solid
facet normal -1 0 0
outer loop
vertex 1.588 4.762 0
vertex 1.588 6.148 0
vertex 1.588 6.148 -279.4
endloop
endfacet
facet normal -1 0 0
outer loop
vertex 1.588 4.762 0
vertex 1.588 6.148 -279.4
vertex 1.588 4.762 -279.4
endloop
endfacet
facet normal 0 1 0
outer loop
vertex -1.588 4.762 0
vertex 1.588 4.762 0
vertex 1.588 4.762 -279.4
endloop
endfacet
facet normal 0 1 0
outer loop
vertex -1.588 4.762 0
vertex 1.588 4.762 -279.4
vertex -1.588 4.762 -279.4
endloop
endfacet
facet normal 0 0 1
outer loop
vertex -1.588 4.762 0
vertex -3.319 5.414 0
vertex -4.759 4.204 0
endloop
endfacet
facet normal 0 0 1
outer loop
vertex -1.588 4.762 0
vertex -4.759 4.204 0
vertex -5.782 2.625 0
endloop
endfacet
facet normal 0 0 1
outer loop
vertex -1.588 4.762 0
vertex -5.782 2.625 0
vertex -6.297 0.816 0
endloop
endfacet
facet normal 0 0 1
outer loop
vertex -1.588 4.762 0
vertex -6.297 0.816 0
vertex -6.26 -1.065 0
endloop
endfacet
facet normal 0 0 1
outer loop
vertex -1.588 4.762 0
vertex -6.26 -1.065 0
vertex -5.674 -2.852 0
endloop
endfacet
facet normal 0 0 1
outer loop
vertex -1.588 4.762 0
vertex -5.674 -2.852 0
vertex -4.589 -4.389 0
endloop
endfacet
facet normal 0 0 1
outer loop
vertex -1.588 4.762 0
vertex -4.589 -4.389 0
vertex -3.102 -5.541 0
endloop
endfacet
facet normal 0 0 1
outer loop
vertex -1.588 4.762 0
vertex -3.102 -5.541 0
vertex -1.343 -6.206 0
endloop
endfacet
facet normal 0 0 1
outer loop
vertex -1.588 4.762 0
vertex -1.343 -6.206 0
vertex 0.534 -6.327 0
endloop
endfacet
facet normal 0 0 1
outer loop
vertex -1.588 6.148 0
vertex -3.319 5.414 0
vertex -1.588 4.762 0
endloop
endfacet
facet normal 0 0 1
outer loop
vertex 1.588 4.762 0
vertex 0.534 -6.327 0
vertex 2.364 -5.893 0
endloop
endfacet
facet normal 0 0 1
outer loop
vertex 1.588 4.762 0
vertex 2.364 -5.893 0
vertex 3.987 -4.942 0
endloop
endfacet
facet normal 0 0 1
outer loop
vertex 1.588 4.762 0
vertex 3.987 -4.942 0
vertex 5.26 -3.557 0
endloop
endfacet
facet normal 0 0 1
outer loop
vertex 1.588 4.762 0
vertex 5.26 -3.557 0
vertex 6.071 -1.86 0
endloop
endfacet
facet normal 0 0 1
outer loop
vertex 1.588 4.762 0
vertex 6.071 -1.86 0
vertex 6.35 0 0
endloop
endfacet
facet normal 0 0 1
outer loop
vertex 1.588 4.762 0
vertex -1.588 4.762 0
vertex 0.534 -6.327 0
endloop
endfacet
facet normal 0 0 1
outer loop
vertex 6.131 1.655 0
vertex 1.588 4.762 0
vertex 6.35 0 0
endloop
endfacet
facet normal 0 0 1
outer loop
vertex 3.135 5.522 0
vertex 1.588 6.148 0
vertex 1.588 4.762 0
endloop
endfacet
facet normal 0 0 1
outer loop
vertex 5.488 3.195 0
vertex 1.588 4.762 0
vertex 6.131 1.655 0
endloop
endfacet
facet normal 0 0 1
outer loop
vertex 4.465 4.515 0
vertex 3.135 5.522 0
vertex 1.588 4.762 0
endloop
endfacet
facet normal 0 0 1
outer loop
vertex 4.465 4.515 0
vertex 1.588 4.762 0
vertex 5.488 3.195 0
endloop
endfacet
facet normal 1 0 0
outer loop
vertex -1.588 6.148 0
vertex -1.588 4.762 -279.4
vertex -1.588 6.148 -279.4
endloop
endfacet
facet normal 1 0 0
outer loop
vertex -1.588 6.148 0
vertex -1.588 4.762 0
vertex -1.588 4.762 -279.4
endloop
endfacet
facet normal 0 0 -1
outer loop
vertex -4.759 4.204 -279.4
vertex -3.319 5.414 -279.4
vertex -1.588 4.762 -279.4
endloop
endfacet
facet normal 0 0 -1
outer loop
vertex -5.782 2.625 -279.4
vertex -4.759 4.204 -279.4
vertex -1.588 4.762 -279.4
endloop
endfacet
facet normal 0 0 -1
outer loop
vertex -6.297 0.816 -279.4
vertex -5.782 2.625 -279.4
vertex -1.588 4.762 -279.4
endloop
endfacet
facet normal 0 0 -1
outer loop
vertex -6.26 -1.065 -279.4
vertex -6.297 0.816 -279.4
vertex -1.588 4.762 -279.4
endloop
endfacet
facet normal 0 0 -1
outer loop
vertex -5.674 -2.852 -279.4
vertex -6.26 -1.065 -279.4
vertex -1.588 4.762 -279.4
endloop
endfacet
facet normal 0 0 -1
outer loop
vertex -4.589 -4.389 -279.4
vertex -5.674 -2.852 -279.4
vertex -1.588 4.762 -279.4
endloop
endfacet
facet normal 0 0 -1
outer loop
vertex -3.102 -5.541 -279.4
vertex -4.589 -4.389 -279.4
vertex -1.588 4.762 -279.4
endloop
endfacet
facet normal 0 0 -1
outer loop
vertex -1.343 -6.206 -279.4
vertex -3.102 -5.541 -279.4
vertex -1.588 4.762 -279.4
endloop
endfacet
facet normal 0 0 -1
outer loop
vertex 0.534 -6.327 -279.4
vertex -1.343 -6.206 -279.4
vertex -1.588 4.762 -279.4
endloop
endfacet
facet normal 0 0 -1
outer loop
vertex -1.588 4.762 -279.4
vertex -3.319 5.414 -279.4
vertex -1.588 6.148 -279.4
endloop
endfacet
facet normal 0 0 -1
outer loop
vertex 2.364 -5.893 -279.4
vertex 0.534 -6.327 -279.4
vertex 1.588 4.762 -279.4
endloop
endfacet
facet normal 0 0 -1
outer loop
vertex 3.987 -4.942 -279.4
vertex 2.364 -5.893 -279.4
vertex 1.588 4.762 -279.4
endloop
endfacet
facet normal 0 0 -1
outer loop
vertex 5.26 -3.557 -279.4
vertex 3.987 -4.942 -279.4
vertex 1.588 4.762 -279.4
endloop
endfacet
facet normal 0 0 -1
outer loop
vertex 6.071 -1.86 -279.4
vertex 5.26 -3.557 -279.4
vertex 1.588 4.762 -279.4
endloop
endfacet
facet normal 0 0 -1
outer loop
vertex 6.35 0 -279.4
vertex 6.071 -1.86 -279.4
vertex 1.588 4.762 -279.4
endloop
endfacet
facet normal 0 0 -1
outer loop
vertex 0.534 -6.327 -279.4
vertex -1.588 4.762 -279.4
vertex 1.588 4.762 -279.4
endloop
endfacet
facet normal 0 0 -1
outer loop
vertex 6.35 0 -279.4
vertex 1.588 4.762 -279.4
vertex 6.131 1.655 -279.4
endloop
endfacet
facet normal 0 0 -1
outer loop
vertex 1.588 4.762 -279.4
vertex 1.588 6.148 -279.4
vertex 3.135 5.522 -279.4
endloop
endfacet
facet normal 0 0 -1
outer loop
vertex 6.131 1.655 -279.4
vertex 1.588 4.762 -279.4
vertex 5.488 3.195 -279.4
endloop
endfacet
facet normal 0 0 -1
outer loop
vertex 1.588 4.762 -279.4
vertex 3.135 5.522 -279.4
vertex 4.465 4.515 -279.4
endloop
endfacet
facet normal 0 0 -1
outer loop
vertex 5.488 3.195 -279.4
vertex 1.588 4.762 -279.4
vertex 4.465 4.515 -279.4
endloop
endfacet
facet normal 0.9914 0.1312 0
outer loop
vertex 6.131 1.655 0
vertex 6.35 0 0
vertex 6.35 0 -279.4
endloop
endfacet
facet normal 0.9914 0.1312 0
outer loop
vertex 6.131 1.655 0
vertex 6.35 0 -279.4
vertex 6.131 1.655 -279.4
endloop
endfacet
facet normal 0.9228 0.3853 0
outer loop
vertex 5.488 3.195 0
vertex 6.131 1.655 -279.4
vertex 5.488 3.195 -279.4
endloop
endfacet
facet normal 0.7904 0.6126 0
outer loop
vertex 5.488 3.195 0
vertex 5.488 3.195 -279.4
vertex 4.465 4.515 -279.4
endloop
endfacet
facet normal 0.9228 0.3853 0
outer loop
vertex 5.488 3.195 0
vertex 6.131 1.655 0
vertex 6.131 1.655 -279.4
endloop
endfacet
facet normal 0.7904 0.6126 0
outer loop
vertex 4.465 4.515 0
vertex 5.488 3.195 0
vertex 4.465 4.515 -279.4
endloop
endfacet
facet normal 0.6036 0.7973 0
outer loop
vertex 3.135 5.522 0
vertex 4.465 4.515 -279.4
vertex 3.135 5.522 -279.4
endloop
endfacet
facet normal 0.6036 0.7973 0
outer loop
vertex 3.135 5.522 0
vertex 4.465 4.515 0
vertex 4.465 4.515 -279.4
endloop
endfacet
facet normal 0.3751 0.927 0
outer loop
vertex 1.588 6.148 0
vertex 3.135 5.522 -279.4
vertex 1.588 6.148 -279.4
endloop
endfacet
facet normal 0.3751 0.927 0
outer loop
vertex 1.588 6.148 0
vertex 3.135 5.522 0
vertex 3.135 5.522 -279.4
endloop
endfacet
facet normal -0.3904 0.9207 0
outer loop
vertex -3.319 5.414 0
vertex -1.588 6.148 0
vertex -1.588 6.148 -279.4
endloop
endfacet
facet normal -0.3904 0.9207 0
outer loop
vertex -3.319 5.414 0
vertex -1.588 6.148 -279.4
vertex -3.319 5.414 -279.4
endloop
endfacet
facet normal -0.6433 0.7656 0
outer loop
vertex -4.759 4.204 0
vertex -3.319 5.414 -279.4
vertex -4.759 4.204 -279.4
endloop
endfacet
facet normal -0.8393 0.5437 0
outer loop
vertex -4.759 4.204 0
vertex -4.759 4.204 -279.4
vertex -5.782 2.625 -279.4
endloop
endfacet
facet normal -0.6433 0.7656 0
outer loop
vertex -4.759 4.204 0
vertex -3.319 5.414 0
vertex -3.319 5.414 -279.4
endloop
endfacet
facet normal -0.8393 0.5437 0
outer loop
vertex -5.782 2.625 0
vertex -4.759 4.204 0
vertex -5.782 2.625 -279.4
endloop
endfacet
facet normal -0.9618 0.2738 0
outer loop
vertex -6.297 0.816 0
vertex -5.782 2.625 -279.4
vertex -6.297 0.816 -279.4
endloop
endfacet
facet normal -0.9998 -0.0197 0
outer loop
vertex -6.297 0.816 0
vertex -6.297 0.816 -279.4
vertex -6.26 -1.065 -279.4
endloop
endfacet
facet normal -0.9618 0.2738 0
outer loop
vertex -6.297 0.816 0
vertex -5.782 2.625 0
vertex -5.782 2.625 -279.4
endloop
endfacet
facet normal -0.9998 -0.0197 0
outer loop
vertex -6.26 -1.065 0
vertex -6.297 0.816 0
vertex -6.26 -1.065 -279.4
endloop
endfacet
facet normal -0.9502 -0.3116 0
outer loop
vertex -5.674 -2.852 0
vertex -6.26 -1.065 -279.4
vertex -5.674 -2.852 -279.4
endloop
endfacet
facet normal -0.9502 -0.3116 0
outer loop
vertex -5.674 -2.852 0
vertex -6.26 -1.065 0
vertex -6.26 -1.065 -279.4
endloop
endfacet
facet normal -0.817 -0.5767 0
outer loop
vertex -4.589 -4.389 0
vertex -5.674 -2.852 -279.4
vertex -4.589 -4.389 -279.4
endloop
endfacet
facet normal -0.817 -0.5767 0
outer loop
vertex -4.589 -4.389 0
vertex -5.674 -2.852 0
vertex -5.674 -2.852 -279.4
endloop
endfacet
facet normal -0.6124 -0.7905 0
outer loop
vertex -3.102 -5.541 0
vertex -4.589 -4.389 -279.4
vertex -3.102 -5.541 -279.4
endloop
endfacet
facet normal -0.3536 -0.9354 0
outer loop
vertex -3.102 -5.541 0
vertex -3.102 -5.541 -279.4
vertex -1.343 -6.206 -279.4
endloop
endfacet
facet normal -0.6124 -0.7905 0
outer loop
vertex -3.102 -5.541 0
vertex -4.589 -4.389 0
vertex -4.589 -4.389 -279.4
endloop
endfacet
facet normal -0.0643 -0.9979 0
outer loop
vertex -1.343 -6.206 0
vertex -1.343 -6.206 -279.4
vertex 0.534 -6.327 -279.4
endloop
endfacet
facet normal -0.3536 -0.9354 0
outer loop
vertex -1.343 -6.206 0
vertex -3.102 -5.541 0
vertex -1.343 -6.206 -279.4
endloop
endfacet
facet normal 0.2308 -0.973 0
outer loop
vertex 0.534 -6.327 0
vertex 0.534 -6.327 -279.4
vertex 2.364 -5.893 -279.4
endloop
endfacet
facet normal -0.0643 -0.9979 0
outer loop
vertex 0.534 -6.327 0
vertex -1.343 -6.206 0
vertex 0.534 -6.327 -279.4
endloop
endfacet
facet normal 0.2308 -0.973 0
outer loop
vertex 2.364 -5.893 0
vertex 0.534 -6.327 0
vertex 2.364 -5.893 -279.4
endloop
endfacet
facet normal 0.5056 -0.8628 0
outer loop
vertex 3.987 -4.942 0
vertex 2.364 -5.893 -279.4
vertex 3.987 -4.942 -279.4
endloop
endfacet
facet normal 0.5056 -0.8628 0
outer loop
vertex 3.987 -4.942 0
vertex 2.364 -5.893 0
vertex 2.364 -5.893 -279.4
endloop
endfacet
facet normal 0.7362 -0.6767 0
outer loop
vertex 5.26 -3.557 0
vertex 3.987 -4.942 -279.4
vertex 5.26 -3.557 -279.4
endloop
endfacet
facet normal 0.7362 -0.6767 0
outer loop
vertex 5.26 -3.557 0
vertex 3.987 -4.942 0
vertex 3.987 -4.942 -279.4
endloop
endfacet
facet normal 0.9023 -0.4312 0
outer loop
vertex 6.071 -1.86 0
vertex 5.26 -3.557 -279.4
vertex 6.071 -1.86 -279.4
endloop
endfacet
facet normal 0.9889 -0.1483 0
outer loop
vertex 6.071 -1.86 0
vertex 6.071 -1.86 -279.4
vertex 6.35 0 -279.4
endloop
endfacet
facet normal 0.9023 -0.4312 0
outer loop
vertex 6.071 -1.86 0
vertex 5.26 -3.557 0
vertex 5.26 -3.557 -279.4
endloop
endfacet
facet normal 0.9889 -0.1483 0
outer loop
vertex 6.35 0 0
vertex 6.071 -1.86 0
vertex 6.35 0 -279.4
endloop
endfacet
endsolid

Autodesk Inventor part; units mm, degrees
ref_plane "YZ Plane" through (0, 0, 0) normal (1, 0, 0) x (0, 1, 0)
ref_plane "XZ Plane" through (0, 0, 0) normal (0, 1, 0) x (-1, 0, 0)
ref_plane "XY Plane" through (0, 0, 0) normal (0, 0, 1) x (1, 0, 0)
sketch "Sketch1" plane through (0, 0, 0) normal (0, 0, 1) x (1, 0, 0)
  circle A0 centre (0, 0) radius 6.35
  line L0 (-1.5875, 7.9375) -> (1.5875, 7.9375)
  line L1 (1.5875, 7.9375) -> (1.5875, 4.7625)
  line L2 (1.5875, 4.7625) -> (-1.5875, 4.7625)
  line L3 (-1.5875, 4.7625) -> (-1.5875, 7.9375)
  line L4 (1.5875, 4.7625) -> (1.5875, 6.1484)
  line L5 (-1.5875, 4.7625) -> (-1.5875, 6.1484)
  line L6 (1.5875, 4.7625) -> (-1.5875, 4.7625)
  point P0 (0, 4.7625)
  dimension "d0" = 12.7
  dimension "d1" = 3.175
  dimension "d2" = 3.175
  dimension "d3" = 4.7625
extrude "Extrusion1" add sketch "Sketch1" against normal blind 279.4 contours A0 L3 L2 L1 picked at (0.1781, 1.0658)
properties part number "11in axle"
